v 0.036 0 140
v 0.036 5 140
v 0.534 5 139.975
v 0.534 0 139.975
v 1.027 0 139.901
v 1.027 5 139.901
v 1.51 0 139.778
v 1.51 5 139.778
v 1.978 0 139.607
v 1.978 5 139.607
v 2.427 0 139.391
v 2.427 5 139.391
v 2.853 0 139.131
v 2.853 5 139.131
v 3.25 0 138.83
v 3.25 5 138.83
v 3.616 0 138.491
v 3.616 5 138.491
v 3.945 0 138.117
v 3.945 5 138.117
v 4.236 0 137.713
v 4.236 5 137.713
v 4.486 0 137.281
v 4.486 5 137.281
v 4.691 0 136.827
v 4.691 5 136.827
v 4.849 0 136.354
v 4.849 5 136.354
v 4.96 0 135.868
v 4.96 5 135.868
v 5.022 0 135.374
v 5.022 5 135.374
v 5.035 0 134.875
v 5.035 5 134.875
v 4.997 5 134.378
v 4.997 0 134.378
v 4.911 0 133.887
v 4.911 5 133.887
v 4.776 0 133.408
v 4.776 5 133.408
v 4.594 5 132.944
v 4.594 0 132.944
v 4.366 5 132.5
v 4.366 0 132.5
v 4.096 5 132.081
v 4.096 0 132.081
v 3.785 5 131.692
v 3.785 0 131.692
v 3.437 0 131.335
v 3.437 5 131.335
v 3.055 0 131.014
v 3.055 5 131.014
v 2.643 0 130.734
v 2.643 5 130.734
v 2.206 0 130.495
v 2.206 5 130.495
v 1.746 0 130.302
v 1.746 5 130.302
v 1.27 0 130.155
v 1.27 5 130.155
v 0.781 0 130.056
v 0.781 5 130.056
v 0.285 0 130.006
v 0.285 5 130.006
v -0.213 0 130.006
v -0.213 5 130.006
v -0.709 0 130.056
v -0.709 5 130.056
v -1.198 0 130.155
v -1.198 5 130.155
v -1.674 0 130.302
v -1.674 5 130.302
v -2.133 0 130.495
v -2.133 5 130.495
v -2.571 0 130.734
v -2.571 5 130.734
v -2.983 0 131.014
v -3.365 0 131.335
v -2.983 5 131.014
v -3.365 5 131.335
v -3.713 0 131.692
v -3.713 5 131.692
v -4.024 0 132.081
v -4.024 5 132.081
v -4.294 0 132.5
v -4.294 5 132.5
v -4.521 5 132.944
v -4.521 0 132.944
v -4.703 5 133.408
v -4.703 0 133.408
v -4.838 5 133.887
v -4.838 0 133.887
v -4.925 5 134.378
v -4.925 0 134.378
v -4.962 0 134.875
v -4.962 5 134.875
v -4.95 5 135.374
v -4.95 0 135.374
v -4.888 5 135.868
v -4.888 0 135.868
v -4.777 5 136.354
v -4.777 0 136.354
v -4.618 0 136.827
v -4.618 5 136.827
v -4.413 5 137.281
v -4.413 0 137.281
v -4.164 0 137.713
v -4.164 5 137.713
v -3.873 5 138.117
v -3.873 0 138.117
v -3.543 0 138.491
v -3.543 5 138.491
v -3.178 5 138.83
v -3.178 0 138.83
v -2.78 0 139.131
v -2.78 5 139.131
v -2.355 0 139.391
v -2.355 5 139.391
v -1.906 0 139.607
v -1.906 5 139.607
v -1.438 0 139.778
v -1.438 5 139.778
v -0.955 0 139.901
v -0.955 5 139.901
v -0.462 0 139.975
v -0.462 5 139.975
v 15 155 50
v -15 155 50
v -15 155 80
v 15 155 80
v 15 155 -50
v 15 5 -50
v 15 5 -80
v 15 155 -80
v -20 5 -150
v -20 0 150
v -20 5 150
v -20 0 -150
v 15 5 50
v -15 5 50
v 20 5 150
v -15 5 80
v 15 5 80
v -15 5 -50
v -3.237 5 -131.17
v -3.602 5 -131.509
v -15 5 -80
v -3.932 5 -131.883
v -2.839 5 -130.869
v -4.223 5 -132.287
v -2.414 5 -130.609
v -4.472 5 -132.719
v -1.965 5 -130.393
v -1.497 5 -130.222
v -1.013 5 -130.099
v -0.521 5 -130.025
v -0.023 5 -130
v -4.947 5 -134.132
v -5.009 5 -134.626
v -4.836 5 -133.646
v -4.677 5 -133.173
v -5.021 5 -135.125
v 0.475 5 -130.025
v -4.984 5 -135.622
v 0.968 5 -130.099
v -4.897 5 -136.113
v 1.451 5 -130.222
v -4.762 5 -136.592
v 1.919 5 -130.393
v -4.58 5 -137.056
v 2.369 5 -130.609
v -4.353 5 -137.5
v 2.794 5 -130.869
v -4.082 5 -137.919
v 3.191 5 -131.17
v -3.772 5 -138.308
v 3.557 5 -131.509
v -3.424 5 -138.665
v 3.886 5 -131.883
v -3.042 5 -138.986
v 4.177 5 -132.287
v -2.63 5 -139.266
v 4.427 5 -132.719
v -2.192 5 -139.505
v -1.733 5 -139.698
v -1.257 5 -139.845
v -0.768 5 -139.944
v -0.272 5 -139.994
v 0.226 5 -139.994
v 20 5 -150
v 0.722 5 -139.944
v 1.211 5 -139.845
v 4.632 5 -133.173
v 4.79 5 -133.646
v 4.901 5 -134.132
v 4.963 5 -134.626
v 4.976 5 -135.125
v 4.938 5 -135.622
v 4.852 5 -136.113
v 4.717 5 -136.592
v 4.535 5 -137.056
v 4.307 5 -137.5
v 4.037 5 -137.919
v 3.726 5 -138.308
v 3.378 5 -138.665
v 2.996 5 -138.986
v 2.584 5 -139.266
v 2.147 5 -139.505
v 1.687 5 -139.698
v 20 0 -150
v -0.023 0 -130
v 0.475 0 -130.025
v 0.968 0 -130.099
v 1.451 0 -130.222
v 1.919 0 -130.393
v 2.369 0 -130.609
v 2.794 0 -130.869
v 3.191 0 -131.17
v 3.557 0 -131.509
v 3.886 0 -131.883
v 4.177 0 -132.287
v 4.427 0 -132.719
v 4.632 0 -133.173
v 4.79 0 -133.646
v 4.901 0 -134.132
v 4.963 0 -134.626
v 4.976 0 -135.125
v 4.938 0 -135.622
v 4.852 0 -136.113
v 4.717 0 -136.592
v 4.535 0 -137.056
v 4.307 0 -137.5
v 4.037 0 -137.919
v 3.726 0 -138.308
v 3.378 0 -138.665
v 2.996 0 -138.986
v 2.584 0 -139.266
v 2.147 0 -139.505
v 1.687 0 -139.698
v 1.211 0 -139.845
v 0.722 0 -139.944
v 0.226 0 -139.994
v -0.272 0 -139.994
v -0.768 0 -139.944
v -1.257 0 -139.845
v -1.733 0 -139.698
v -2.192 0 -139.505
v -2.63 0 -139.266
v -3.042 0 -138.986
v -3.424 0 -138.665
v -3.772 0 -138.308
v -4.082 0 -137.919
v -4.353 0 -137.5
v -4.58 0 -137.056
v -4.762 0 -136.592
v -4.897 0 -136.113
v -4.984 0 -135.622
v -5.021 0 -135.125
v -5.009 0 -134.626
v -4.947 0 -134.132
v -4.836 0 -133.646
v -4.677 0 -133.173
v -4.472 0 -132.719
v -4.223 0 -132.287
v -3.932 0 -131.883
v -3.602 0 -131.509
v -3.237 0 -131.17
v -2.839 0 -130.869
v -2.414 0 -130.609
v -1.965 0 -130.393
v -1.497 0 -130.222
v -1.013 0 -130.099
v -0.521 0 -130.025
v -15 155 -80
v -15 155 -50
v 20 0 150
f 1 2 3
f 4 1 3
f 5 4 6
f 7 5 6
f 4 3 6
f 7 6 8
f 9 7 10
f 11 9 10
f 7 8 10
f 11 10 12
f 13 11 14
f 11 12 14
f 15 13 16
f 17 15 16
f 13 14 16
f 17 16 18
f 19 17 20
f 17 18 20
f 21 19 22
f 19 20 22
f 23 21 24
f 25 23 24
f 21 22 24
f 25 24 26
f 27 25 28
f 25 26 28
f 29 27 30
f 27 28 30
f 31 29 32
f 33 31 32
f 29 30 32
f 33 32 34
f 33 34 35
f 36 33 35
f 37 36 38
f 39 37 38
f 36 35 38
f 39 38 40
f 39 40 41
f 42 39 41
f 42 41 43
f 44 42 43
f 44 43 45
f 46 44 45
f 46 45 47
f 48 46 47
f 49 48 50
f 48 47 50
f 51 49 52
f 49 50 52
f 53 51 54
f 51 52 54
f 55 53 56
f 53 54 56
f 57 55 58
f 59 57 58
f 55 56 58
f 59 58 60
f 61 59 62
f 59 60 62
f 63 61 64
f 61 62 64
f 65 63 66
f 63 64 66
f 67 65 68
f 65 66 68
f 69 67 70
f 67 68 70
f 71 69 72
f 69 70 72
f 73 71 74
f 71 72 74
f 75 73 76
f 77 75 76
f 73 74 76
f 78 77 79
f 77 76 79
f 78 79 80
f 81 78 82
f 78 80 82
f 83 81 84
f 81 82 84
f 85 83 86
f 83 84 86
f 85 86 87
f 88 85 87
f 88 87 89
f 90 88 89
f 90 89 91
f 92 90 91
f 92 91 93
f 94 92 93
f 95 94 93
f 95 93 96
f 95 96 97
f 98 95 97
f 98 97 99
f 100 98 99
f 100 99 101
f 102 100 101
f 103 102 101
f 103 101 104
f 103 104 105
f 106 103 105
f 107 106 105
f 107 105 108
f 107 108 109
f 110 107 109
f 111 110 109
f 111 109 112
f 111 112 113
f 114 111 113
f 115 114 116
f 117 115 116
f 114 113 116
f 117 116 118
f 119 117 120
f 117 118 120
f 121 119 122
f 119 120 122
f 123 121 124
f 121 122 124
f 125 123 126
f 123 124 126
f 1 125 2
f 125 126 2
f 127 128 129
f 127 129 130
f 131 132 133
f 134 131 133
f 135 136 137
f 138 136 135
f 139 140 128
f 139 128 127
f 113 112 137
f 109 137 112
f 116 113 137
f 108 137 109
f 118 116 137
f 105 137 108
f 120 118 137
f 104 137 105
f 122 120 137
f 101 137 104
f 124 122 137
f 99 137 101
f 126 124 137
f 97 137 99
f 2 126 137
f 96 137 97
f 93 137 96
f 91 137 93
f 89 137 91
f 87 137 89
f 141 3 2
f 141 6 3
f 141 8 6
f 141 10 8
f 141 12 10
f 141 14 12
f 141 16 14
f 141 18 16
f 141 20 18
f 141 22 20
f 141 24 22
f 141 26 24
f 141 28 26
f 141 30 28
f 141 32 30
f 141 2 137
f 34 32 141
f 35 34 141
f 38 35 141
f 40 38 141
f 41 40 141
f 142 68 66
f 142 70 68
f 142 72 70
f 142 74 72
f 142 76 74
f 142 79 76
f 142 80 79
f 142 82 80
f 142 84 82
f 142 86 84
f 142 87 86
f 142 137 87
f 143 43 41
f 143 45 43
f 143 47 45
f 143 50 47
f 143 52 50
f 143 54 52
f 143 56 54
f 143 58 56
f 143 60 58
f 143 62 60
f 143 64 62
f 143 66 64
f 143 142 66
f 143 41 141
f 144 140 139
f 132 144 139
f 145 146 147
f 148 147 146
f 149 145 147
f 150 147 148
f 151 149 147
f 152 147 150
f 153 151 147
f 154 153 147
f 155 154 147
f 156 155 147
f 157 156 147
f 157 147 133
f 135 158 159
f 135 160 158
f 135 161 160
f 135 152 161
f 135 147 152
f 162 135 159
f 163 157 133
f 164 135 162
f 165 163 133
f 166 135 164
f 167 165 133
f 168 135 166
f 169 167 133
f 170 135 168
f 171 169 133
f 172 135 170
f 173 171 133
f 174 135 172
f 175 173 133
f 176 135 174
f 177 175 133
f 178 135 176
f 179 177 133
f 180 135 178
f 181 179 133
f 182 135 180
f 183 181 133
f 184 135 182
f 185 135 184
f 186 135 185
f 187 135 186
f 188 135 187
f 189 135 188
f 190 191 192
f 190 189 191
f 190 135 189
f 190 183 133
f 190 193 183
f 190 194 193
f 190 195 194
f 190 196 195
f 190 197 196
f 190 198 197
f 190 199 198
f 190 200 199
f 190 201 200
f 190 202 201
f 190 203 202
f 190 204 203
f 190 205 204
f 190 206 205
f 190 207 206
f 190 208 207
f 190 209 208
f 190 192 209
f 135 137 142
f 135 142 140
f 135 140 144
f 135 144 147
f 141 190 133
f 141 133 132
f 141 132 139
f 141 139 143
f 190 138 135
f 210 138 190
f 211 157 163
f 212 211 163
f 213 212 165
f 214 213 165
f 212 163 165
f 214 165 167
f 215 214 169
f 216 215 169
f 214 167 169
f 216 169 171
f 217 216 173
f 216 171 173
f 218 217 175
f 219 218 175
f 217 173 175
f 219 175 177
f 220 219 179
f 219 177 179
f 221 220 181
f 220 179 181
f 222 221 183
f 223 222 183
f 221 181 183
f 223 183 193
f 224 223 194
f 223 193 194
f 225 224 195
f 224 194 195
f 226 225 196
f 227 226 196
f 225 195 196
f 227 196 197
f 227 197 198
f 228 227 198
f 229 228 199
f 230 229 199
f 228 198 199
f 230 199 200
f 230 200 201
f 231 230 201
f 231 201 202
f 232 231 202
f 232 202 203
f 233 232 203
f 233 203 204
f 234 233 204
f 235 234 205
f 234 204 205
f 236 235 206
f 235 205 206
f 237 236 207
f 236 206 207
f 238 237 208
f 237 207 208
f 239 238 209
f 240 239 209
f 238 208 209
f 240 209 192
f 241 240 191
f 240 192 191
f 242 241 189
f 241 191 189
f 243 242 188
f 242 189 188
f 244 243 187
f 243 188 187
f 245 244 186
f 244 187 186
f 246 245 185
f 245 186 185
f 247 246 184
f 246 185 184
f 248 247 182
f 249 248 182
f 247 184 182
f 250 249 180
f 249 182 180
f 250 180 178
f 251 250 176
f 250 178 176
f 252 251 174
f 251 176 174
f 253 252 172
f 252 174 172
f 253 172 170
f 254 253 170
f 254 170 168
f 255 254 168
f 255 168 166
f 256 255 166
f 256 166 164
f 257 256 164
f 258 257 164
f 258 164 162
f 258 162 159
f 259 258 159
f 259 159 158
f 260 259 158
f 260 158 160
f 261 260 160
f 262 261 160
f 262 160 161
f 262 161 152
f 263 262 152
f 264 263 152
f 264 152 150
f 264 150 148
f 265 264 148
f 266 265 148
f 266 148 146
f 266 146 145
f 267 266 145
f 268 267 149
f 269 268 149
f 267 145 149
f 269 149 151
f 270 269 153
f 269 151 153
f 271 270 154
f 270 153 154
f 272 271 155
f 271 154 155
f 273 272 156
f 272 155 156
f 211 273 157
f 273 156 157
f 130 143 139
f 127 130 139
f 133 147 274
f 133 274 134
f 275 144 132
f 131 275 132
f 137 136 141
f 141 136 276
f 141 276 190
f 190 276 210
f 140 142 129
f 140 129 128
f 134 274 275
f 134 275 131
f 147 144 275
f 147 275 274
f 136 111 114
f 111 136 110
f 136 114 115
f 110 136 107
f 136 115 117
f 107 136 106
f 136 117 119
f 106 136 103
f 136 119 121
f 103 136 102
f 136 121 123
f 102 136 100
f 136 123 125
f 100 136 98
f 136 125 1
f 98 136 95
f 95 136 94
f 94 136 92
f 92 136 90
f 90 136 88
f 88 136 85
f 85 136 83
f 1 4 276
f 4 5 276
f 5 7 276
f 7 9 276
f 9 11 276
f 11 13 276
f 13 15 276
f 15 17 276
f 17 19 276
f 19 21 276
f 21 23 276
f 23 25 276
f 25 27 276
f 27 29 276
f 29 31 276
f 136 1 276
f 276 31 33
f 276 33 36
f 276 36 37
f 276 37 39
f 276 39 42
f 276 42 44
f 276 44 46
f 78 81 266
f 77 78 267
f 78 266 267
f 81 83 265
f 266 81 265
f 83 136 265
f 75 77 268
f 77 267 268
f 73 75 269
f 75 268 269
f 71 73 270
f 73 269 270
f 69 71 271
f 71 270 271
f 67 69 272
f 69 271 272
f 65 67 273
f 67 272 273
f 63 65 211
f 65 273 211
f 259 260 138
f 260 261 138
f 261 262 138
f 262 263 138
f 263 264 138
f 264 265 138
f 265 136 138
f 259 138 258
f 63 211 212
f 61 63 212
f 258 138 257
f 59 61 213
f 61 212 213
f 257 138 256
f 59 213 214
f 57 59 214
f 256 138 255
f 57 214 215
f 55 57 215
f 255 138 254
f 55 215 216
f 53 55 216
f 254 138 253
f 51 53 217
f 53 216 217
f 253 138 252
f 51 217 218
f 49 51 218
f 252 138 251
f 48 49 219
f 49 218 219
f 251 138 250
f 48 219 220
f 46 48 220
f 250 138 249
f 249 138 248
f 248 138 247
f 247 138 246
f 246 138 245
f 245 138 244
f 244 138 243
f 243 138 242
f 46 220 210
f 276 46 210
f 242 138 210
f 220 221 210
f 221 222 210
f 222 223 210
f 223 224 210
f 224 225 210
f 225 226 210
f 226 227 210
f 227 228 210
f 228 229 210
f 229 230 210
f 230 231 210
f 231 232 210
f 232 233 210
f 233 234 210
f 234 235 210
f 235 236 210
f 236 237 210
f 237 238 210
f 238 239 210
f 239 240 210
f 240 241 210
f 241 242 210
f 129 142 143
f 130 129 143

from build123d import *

# Parameters (mm, degrees)
SKETCH1_W           = 40
SKETCH1_H           = 300
BOSS_EXTRUDE1_DEPTH = 5
SKETCH2_W           = 30
SKETCH2_H           = 30
BOSS_EXTRUDE2_DEPTH = 150
SKETCH3_R           = 5
CUT_EXTRUDE2_DEPTH  = 5
SKETCH6_R           = 5
CUT_EXTRUDE3_DEPTH  = 5


with BuildPart() as part:
    # Sketch1 → Boss-Extrude1 (new body)
    with BuildSketch(Plane(origin=(0, 0, 0), x_dir=(1, 0, 0), z_dir=(0, 1, 0))):
        Rectangle(SKETCH1_W, SKETCH1_H)
    extrude(amount=BOSS_EXTRUDE1_DEPTH)

    # Sketch2 → Boss-Extrude2 (add)
    with BuildSketch(Plane(origin=(0, 5, 0), x_dir=(1, 0, 0), z_dir=(0, 1, 0))):
        with Locations((0, 65)):
            Rectangle(SKETCH2_W, SKETCH2_H)
        with Locations((0, -65)):
            Rectangle(SKETCH2_W, SKETCH2_H)
    extrude(amount=BOSS_EXTRUDE2_DEPTH)

    # Sketch3 → Cut-Extrude2 (cut)
    with BuildSketch(Plane(origin=(0, 5, 0), x_dir=(1, 0, 0), z_dir=(0, 1, 0))):
        with Locations(Location((-0.022747462, 135, 0), (0, 0, 270))):
            Circle(SKETCH3_R)
    extrude(amount=-CUT_EXTRUDE2_DEPTH, mode=Mode.SUBTRACT)

    # Sketch6 → Cut-Extrude3 (cut)
    with BuildSketch(Plane(origin=(0, 5, 0), x_dir=(1, 0, 0), z_dir=(0, 1, 0))):
        with Locations(Location((0.036186428, -135, 0), (0, 0, 270))):
            Circle(SKETCH6_R)
    extrude(amount=-CUT_EXTRUDE3_DEPTH, mode=Mode.SUBTRACT)


solid = part.part
